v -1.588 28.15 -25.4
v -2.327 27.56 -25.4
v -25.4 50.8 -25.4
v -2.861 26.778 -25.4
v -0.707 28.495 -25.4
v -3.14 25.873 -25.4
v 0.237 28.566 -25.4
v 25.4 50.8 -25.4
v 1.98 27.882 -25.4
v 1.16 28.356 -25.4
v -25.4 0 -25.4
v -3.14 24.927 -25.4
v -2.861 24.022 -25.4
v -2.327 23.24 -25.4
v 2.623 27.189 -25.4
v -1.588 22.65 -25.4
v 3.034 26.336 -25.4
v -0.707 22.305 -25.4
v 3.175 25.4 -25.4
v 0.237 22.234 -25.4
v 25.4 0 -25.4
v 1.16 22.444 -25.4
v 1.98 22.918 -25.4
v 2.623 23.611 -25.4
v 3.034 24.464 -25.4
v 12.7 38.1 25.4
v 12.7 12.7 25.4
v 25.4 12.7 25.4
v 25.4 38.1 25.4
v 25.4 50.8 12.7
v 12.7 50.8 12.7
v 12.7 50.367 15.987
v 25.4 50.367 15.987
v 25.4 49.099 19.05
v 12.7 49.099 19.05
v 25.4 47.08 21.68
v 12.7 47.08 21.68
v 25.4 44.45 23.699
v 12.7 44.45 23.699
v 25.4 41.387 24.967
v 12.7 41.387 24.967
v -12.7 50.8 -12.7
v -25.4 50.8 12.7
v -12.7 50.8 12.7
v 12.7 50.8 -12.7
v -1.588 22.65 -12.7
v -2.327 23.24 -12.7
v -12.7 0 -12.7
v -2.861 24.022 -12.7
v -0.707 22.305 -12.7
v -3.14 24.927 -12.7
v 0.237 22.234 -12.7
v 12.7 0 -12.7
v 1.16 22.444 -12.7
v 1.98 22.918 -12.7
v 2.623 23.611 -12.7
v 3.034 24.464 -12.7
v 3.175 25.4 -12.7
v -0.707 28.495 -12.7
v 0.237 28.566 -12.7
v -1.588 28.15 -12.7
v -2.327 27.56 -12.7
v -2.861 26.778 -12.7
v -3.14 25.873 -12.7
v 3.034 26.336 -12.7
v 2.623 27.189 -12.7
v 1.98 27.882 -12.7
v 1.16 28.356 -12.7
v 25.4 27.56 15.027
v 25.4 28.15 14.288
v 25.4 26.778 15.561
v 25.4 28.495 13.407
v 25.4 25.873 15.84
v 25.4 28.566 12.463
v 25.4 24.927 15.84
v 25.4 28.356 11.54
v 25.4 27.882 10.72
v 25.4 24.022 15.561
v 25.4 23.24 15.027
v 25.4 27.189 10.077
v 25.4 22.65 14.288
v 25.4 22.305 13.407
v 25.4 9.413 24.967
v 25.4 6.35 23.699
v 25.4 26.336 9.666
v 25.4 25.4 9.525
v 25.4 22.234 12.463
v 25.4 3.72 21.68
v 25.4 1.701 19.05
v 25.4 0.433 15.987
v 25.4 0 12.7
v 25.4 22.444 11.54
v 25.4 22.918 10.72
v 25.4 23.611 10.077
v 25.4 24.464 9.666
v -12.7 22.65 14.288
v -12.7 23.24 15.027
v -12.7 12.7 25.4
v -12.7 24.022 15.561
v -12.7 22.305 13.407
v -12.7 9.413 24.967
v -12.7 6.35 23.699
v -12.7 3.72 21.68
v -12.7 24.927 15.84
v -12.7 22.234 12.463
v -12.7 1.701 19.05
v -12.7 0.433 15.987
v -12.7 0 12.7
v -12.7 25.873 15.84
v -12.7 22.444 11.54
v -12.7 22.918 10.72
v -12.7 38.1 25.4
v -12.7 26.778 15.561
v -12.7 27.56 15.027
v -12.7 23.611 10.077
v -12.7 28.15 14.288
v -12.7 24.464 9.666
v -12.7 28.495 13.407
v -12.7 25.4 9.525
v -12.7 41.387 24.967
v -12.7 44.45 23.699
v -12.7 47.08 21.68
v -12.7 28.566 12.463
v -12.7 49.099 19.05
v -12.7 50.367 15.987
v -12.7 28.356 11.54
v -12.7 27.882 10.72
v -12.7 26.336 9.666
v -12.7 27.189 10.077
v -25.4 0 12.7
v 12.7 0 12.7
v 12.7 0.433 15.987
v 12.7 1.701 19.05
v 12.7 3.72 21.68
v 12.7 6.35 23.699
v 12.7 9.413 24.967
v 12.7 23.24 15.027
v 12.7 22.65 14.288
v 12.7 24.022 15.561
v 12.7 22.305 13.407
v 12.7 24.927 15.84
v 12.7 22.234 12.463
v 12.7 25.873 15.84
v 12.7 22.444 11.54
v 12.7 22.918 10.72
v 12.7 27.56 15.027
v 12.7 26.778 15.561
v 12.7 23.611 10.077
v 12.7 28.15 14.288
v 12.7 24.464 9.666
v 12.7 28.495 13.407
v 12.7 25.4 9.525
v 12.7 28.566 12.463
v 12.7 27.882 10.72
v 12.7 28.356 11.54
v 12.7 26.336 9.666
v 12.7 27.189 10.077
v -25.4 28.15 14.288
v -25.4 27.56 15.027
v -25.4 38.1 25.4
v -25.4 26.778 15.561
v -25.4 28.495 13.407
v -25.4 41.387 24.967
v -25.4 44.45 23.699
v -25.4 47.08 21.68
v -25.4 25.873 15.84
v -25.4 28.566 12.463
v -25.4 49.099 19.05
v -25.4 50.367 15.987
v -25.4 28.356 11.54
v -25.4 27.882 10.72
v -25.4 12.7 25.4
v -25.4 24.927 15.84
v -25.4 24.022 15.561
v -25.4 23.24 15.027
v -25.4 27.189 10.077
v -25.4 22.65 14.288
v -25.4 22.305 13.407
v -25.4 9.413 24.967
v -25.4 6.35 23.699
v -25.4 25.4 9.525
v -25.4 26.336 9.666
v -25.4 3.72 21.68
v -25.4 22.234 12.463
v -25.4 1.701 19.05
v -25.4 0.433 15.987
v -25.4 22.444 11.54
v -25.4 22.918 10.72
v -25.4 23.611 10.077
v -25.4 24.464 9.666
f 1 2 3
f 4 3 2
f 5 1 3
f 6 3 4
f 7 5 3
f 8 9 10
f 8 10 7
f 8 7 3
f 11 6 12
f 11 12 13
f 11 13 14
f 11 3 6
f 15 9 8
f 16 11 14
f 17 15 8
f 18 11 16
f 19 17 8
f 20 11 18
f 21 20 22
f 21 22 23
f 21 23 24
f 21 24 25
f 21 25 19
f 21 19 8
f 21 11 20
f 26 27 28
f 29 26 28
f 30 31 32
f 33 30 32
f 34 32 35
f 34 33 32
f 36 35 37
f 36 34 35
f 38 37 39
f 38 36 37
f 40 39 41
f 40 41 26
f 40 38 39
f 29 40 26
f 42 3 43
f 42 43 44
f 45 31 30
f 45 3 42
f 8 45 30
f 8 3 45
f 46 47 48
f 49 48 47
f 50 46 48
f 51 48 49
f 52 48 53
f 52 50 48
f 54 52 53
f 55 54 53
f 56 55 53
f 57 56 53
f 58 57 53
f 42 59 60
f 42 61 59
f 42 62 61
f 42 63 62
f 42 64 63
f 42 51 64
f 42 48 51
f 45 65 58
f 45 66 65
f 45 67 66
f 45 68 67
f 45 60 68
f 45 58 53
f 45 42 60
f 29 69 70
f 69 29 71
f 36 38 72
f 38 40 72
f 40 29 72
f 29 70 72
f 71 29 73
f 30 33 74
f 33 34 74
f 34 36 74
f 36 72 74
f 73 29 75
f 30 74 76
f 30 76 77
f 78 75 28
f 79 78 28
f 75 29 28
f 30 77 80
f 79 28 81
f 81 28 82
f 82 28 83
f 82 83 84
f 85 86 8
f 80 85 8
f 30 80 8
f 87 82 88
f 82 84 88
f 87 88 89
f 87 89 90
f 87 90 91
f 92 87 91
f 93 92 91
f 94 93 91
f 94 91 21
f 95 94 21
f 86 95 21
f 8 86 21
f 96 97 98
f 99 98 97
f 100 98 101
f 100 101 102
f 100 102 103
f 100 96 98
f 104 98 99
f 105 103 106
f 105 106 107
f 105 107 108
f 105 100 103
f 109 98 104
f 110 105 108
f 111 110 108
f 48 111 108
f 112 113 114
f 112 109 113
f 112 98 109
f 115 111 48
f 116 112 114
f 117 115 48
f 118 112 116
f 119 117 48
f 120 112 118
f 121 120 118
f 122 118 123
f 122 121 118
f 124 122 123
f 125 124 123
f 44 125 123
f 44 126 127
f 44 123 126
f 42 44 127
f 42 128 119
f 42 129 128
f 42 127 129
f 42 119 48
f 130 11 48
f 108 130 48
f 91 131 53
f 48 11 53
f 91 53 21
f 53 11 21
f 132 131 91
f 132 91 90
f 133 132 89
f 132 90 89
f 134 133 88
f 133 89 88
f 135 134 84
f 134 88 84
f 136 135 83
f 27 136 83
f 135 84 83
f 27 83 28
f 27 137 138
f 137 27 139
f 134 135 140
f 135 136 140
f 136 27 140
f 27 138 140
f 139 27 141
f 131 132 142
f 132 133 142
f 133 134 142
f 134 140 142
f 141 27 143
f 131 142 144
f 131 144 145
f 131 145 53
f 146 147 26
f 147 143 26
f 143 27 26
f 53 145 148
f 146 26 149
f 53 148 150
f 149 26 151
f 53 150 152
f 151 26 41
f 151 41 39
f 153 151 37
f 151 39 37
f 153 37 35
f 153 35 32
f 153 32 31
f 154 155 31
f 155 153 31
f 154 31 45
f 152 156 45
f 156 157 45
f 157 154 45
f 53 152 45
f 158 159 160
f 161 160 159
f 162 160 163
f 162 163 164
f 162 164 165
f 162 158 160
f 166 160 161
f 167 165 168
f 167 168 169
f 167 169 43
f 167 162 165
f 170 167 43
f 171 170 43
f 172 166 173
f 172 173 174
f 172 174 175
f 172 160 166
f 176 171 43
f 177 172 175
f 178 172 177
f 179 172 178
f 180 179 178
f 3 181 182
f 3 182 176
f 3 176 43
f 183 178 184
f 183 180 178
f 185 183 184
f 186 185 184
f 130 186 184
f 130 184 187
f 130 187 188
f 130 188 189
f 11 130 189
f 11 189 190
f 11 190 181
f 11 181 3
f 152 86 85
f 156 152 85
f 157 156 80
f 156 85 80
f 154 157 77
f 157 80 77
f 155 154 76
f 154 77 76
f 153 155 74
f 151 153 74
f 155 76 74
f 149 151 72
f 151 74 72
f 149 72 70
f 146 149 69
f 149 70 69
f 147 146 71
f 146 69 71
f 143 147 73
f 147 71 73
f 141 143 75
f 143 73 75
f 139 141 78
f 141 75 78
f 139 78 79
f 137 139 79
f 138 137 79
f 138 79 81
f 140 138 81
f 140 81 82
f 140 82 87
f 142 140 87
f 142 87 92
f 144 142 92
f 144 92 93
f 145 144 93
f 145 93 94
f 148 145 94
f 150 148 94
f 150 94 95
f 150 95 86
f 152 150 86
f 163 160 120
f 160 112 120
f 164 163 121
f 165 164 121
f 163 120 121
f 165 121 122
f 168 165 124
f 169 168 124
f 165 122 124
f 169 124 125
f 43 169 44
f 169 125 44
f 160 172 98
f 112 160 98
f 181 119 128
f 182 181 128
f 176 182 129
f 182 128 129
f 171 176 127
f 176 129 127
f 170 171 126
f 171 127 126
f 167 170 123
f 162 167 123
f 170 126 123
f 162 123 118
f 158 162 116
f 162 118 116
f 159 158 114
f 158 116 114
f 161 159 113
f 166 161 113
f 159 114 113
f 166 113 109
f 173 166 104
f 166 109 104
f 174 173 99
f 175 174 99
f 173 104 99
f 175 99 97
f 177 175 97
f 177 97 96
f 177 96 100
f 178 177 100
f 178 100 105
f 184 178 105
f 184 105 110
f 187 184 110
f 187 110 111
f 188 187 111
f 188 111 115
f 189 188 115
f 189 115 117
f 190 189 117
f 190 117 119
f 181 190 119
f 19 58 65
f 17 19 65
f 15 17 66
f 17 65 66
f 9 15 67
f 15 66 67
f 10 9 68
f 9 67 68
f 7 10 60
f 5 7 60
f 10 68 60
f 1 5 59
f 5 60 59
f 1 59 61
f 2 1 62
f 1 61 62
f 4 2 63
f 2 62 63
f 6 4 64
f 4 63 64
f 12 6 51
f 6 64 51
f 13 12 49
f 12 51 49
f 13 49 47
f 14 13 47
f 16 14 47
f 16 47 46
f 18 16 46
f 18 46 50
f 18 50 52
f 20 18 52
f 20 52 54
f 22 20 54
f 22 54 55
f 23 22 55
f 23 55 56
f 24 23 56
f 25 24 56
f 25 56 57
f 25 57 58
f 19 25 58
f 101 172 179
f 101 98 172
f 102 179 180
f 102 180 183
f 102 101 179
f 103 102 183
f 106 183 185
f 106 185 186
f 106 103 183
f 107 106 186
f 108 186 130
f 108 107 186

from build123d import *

# Parameters (mm, degrees)
SKETCH1_W           = 50.8
SKETCH1_H           = 50.8
BOSS_EXTRUDE1_DEPTH = 50.8
SKETCH2_W           = 25.4
SKETCH2_H           = 38.1
CUT_EXTRUDE1_DEPTH  = 51.8
SKETCH3_R           = 3.175
CUT_EXTRUDE2_DEPTH  = 13.7
SKETCH4_R           = 3.175
CUT_EXTRUDE3_DEPTH  = 51.8
FILLET1_R           = 12.7


with BuildPart() as part:
    # Sketch1 → Boss-Extrude1 (new body)
    with BuildSketch(Plane(origin=(0, 0, 0), x_dir=(1, 0, 0), z_dir=(0, 1, 0))):
        Rectangle(SKETCH1_W, SKETCH1_H)
    extrude(amount=BOSS_EXTRUDE1_DEPTH)

    # Sketch2 → Cut-Extrude1 (cut, through all)
    with BuildSketch(Plane(origin=(0, 50.8, 0), x_dir=(1, 0, 0), z_dir=(0, 1, 0))):
        with Locations((0, -6.35)):
            Rectangle(SKETCH2_W, SKETCH2_H)
    extrude(amount=-CUT_EXTRUDE1_DEPTH, mode=Mode.SUBTRACT)

    # Sketch3 → Cut-Extrude2 (cut, through all)
    with BuildSketch(Plane.XY.offset(-12.7)):
        with Locations((0, 25.4)):
            Circle(SKETCH3_R)
    extrude(amount=-CUT_EXTRUDE2_DEPTH, mode=Mode.SUBTRACT)

    # Sketch4 → Cut-Extrude3 (cut, through all)
    with BuildSketch(Plane(origin=(25.4, 0, 0), x_dir=(0, 0, -1), z_dir=(1, 0, 0))):
        with Locations((-12.7, 25.4)):
            Circle(SKETCH4_R)
    extrude(amount=-CUT_EXTRUDE3_DEPTH, mode=Mode.SUBTRACT)

    # Fillet1
    fillet1_edges = [part.edges().sort_by_distance(p)[0] for p in [
        (19.05, 0, 25.4),
        (19.05, 50.8, 25.4),
        (-19.05, 0, 25.4),
        (-19.05, 50.8, 25.4),
    ]]
    fillet(fillet1_edges, radius=FILLET1_R)


solid = part.part
